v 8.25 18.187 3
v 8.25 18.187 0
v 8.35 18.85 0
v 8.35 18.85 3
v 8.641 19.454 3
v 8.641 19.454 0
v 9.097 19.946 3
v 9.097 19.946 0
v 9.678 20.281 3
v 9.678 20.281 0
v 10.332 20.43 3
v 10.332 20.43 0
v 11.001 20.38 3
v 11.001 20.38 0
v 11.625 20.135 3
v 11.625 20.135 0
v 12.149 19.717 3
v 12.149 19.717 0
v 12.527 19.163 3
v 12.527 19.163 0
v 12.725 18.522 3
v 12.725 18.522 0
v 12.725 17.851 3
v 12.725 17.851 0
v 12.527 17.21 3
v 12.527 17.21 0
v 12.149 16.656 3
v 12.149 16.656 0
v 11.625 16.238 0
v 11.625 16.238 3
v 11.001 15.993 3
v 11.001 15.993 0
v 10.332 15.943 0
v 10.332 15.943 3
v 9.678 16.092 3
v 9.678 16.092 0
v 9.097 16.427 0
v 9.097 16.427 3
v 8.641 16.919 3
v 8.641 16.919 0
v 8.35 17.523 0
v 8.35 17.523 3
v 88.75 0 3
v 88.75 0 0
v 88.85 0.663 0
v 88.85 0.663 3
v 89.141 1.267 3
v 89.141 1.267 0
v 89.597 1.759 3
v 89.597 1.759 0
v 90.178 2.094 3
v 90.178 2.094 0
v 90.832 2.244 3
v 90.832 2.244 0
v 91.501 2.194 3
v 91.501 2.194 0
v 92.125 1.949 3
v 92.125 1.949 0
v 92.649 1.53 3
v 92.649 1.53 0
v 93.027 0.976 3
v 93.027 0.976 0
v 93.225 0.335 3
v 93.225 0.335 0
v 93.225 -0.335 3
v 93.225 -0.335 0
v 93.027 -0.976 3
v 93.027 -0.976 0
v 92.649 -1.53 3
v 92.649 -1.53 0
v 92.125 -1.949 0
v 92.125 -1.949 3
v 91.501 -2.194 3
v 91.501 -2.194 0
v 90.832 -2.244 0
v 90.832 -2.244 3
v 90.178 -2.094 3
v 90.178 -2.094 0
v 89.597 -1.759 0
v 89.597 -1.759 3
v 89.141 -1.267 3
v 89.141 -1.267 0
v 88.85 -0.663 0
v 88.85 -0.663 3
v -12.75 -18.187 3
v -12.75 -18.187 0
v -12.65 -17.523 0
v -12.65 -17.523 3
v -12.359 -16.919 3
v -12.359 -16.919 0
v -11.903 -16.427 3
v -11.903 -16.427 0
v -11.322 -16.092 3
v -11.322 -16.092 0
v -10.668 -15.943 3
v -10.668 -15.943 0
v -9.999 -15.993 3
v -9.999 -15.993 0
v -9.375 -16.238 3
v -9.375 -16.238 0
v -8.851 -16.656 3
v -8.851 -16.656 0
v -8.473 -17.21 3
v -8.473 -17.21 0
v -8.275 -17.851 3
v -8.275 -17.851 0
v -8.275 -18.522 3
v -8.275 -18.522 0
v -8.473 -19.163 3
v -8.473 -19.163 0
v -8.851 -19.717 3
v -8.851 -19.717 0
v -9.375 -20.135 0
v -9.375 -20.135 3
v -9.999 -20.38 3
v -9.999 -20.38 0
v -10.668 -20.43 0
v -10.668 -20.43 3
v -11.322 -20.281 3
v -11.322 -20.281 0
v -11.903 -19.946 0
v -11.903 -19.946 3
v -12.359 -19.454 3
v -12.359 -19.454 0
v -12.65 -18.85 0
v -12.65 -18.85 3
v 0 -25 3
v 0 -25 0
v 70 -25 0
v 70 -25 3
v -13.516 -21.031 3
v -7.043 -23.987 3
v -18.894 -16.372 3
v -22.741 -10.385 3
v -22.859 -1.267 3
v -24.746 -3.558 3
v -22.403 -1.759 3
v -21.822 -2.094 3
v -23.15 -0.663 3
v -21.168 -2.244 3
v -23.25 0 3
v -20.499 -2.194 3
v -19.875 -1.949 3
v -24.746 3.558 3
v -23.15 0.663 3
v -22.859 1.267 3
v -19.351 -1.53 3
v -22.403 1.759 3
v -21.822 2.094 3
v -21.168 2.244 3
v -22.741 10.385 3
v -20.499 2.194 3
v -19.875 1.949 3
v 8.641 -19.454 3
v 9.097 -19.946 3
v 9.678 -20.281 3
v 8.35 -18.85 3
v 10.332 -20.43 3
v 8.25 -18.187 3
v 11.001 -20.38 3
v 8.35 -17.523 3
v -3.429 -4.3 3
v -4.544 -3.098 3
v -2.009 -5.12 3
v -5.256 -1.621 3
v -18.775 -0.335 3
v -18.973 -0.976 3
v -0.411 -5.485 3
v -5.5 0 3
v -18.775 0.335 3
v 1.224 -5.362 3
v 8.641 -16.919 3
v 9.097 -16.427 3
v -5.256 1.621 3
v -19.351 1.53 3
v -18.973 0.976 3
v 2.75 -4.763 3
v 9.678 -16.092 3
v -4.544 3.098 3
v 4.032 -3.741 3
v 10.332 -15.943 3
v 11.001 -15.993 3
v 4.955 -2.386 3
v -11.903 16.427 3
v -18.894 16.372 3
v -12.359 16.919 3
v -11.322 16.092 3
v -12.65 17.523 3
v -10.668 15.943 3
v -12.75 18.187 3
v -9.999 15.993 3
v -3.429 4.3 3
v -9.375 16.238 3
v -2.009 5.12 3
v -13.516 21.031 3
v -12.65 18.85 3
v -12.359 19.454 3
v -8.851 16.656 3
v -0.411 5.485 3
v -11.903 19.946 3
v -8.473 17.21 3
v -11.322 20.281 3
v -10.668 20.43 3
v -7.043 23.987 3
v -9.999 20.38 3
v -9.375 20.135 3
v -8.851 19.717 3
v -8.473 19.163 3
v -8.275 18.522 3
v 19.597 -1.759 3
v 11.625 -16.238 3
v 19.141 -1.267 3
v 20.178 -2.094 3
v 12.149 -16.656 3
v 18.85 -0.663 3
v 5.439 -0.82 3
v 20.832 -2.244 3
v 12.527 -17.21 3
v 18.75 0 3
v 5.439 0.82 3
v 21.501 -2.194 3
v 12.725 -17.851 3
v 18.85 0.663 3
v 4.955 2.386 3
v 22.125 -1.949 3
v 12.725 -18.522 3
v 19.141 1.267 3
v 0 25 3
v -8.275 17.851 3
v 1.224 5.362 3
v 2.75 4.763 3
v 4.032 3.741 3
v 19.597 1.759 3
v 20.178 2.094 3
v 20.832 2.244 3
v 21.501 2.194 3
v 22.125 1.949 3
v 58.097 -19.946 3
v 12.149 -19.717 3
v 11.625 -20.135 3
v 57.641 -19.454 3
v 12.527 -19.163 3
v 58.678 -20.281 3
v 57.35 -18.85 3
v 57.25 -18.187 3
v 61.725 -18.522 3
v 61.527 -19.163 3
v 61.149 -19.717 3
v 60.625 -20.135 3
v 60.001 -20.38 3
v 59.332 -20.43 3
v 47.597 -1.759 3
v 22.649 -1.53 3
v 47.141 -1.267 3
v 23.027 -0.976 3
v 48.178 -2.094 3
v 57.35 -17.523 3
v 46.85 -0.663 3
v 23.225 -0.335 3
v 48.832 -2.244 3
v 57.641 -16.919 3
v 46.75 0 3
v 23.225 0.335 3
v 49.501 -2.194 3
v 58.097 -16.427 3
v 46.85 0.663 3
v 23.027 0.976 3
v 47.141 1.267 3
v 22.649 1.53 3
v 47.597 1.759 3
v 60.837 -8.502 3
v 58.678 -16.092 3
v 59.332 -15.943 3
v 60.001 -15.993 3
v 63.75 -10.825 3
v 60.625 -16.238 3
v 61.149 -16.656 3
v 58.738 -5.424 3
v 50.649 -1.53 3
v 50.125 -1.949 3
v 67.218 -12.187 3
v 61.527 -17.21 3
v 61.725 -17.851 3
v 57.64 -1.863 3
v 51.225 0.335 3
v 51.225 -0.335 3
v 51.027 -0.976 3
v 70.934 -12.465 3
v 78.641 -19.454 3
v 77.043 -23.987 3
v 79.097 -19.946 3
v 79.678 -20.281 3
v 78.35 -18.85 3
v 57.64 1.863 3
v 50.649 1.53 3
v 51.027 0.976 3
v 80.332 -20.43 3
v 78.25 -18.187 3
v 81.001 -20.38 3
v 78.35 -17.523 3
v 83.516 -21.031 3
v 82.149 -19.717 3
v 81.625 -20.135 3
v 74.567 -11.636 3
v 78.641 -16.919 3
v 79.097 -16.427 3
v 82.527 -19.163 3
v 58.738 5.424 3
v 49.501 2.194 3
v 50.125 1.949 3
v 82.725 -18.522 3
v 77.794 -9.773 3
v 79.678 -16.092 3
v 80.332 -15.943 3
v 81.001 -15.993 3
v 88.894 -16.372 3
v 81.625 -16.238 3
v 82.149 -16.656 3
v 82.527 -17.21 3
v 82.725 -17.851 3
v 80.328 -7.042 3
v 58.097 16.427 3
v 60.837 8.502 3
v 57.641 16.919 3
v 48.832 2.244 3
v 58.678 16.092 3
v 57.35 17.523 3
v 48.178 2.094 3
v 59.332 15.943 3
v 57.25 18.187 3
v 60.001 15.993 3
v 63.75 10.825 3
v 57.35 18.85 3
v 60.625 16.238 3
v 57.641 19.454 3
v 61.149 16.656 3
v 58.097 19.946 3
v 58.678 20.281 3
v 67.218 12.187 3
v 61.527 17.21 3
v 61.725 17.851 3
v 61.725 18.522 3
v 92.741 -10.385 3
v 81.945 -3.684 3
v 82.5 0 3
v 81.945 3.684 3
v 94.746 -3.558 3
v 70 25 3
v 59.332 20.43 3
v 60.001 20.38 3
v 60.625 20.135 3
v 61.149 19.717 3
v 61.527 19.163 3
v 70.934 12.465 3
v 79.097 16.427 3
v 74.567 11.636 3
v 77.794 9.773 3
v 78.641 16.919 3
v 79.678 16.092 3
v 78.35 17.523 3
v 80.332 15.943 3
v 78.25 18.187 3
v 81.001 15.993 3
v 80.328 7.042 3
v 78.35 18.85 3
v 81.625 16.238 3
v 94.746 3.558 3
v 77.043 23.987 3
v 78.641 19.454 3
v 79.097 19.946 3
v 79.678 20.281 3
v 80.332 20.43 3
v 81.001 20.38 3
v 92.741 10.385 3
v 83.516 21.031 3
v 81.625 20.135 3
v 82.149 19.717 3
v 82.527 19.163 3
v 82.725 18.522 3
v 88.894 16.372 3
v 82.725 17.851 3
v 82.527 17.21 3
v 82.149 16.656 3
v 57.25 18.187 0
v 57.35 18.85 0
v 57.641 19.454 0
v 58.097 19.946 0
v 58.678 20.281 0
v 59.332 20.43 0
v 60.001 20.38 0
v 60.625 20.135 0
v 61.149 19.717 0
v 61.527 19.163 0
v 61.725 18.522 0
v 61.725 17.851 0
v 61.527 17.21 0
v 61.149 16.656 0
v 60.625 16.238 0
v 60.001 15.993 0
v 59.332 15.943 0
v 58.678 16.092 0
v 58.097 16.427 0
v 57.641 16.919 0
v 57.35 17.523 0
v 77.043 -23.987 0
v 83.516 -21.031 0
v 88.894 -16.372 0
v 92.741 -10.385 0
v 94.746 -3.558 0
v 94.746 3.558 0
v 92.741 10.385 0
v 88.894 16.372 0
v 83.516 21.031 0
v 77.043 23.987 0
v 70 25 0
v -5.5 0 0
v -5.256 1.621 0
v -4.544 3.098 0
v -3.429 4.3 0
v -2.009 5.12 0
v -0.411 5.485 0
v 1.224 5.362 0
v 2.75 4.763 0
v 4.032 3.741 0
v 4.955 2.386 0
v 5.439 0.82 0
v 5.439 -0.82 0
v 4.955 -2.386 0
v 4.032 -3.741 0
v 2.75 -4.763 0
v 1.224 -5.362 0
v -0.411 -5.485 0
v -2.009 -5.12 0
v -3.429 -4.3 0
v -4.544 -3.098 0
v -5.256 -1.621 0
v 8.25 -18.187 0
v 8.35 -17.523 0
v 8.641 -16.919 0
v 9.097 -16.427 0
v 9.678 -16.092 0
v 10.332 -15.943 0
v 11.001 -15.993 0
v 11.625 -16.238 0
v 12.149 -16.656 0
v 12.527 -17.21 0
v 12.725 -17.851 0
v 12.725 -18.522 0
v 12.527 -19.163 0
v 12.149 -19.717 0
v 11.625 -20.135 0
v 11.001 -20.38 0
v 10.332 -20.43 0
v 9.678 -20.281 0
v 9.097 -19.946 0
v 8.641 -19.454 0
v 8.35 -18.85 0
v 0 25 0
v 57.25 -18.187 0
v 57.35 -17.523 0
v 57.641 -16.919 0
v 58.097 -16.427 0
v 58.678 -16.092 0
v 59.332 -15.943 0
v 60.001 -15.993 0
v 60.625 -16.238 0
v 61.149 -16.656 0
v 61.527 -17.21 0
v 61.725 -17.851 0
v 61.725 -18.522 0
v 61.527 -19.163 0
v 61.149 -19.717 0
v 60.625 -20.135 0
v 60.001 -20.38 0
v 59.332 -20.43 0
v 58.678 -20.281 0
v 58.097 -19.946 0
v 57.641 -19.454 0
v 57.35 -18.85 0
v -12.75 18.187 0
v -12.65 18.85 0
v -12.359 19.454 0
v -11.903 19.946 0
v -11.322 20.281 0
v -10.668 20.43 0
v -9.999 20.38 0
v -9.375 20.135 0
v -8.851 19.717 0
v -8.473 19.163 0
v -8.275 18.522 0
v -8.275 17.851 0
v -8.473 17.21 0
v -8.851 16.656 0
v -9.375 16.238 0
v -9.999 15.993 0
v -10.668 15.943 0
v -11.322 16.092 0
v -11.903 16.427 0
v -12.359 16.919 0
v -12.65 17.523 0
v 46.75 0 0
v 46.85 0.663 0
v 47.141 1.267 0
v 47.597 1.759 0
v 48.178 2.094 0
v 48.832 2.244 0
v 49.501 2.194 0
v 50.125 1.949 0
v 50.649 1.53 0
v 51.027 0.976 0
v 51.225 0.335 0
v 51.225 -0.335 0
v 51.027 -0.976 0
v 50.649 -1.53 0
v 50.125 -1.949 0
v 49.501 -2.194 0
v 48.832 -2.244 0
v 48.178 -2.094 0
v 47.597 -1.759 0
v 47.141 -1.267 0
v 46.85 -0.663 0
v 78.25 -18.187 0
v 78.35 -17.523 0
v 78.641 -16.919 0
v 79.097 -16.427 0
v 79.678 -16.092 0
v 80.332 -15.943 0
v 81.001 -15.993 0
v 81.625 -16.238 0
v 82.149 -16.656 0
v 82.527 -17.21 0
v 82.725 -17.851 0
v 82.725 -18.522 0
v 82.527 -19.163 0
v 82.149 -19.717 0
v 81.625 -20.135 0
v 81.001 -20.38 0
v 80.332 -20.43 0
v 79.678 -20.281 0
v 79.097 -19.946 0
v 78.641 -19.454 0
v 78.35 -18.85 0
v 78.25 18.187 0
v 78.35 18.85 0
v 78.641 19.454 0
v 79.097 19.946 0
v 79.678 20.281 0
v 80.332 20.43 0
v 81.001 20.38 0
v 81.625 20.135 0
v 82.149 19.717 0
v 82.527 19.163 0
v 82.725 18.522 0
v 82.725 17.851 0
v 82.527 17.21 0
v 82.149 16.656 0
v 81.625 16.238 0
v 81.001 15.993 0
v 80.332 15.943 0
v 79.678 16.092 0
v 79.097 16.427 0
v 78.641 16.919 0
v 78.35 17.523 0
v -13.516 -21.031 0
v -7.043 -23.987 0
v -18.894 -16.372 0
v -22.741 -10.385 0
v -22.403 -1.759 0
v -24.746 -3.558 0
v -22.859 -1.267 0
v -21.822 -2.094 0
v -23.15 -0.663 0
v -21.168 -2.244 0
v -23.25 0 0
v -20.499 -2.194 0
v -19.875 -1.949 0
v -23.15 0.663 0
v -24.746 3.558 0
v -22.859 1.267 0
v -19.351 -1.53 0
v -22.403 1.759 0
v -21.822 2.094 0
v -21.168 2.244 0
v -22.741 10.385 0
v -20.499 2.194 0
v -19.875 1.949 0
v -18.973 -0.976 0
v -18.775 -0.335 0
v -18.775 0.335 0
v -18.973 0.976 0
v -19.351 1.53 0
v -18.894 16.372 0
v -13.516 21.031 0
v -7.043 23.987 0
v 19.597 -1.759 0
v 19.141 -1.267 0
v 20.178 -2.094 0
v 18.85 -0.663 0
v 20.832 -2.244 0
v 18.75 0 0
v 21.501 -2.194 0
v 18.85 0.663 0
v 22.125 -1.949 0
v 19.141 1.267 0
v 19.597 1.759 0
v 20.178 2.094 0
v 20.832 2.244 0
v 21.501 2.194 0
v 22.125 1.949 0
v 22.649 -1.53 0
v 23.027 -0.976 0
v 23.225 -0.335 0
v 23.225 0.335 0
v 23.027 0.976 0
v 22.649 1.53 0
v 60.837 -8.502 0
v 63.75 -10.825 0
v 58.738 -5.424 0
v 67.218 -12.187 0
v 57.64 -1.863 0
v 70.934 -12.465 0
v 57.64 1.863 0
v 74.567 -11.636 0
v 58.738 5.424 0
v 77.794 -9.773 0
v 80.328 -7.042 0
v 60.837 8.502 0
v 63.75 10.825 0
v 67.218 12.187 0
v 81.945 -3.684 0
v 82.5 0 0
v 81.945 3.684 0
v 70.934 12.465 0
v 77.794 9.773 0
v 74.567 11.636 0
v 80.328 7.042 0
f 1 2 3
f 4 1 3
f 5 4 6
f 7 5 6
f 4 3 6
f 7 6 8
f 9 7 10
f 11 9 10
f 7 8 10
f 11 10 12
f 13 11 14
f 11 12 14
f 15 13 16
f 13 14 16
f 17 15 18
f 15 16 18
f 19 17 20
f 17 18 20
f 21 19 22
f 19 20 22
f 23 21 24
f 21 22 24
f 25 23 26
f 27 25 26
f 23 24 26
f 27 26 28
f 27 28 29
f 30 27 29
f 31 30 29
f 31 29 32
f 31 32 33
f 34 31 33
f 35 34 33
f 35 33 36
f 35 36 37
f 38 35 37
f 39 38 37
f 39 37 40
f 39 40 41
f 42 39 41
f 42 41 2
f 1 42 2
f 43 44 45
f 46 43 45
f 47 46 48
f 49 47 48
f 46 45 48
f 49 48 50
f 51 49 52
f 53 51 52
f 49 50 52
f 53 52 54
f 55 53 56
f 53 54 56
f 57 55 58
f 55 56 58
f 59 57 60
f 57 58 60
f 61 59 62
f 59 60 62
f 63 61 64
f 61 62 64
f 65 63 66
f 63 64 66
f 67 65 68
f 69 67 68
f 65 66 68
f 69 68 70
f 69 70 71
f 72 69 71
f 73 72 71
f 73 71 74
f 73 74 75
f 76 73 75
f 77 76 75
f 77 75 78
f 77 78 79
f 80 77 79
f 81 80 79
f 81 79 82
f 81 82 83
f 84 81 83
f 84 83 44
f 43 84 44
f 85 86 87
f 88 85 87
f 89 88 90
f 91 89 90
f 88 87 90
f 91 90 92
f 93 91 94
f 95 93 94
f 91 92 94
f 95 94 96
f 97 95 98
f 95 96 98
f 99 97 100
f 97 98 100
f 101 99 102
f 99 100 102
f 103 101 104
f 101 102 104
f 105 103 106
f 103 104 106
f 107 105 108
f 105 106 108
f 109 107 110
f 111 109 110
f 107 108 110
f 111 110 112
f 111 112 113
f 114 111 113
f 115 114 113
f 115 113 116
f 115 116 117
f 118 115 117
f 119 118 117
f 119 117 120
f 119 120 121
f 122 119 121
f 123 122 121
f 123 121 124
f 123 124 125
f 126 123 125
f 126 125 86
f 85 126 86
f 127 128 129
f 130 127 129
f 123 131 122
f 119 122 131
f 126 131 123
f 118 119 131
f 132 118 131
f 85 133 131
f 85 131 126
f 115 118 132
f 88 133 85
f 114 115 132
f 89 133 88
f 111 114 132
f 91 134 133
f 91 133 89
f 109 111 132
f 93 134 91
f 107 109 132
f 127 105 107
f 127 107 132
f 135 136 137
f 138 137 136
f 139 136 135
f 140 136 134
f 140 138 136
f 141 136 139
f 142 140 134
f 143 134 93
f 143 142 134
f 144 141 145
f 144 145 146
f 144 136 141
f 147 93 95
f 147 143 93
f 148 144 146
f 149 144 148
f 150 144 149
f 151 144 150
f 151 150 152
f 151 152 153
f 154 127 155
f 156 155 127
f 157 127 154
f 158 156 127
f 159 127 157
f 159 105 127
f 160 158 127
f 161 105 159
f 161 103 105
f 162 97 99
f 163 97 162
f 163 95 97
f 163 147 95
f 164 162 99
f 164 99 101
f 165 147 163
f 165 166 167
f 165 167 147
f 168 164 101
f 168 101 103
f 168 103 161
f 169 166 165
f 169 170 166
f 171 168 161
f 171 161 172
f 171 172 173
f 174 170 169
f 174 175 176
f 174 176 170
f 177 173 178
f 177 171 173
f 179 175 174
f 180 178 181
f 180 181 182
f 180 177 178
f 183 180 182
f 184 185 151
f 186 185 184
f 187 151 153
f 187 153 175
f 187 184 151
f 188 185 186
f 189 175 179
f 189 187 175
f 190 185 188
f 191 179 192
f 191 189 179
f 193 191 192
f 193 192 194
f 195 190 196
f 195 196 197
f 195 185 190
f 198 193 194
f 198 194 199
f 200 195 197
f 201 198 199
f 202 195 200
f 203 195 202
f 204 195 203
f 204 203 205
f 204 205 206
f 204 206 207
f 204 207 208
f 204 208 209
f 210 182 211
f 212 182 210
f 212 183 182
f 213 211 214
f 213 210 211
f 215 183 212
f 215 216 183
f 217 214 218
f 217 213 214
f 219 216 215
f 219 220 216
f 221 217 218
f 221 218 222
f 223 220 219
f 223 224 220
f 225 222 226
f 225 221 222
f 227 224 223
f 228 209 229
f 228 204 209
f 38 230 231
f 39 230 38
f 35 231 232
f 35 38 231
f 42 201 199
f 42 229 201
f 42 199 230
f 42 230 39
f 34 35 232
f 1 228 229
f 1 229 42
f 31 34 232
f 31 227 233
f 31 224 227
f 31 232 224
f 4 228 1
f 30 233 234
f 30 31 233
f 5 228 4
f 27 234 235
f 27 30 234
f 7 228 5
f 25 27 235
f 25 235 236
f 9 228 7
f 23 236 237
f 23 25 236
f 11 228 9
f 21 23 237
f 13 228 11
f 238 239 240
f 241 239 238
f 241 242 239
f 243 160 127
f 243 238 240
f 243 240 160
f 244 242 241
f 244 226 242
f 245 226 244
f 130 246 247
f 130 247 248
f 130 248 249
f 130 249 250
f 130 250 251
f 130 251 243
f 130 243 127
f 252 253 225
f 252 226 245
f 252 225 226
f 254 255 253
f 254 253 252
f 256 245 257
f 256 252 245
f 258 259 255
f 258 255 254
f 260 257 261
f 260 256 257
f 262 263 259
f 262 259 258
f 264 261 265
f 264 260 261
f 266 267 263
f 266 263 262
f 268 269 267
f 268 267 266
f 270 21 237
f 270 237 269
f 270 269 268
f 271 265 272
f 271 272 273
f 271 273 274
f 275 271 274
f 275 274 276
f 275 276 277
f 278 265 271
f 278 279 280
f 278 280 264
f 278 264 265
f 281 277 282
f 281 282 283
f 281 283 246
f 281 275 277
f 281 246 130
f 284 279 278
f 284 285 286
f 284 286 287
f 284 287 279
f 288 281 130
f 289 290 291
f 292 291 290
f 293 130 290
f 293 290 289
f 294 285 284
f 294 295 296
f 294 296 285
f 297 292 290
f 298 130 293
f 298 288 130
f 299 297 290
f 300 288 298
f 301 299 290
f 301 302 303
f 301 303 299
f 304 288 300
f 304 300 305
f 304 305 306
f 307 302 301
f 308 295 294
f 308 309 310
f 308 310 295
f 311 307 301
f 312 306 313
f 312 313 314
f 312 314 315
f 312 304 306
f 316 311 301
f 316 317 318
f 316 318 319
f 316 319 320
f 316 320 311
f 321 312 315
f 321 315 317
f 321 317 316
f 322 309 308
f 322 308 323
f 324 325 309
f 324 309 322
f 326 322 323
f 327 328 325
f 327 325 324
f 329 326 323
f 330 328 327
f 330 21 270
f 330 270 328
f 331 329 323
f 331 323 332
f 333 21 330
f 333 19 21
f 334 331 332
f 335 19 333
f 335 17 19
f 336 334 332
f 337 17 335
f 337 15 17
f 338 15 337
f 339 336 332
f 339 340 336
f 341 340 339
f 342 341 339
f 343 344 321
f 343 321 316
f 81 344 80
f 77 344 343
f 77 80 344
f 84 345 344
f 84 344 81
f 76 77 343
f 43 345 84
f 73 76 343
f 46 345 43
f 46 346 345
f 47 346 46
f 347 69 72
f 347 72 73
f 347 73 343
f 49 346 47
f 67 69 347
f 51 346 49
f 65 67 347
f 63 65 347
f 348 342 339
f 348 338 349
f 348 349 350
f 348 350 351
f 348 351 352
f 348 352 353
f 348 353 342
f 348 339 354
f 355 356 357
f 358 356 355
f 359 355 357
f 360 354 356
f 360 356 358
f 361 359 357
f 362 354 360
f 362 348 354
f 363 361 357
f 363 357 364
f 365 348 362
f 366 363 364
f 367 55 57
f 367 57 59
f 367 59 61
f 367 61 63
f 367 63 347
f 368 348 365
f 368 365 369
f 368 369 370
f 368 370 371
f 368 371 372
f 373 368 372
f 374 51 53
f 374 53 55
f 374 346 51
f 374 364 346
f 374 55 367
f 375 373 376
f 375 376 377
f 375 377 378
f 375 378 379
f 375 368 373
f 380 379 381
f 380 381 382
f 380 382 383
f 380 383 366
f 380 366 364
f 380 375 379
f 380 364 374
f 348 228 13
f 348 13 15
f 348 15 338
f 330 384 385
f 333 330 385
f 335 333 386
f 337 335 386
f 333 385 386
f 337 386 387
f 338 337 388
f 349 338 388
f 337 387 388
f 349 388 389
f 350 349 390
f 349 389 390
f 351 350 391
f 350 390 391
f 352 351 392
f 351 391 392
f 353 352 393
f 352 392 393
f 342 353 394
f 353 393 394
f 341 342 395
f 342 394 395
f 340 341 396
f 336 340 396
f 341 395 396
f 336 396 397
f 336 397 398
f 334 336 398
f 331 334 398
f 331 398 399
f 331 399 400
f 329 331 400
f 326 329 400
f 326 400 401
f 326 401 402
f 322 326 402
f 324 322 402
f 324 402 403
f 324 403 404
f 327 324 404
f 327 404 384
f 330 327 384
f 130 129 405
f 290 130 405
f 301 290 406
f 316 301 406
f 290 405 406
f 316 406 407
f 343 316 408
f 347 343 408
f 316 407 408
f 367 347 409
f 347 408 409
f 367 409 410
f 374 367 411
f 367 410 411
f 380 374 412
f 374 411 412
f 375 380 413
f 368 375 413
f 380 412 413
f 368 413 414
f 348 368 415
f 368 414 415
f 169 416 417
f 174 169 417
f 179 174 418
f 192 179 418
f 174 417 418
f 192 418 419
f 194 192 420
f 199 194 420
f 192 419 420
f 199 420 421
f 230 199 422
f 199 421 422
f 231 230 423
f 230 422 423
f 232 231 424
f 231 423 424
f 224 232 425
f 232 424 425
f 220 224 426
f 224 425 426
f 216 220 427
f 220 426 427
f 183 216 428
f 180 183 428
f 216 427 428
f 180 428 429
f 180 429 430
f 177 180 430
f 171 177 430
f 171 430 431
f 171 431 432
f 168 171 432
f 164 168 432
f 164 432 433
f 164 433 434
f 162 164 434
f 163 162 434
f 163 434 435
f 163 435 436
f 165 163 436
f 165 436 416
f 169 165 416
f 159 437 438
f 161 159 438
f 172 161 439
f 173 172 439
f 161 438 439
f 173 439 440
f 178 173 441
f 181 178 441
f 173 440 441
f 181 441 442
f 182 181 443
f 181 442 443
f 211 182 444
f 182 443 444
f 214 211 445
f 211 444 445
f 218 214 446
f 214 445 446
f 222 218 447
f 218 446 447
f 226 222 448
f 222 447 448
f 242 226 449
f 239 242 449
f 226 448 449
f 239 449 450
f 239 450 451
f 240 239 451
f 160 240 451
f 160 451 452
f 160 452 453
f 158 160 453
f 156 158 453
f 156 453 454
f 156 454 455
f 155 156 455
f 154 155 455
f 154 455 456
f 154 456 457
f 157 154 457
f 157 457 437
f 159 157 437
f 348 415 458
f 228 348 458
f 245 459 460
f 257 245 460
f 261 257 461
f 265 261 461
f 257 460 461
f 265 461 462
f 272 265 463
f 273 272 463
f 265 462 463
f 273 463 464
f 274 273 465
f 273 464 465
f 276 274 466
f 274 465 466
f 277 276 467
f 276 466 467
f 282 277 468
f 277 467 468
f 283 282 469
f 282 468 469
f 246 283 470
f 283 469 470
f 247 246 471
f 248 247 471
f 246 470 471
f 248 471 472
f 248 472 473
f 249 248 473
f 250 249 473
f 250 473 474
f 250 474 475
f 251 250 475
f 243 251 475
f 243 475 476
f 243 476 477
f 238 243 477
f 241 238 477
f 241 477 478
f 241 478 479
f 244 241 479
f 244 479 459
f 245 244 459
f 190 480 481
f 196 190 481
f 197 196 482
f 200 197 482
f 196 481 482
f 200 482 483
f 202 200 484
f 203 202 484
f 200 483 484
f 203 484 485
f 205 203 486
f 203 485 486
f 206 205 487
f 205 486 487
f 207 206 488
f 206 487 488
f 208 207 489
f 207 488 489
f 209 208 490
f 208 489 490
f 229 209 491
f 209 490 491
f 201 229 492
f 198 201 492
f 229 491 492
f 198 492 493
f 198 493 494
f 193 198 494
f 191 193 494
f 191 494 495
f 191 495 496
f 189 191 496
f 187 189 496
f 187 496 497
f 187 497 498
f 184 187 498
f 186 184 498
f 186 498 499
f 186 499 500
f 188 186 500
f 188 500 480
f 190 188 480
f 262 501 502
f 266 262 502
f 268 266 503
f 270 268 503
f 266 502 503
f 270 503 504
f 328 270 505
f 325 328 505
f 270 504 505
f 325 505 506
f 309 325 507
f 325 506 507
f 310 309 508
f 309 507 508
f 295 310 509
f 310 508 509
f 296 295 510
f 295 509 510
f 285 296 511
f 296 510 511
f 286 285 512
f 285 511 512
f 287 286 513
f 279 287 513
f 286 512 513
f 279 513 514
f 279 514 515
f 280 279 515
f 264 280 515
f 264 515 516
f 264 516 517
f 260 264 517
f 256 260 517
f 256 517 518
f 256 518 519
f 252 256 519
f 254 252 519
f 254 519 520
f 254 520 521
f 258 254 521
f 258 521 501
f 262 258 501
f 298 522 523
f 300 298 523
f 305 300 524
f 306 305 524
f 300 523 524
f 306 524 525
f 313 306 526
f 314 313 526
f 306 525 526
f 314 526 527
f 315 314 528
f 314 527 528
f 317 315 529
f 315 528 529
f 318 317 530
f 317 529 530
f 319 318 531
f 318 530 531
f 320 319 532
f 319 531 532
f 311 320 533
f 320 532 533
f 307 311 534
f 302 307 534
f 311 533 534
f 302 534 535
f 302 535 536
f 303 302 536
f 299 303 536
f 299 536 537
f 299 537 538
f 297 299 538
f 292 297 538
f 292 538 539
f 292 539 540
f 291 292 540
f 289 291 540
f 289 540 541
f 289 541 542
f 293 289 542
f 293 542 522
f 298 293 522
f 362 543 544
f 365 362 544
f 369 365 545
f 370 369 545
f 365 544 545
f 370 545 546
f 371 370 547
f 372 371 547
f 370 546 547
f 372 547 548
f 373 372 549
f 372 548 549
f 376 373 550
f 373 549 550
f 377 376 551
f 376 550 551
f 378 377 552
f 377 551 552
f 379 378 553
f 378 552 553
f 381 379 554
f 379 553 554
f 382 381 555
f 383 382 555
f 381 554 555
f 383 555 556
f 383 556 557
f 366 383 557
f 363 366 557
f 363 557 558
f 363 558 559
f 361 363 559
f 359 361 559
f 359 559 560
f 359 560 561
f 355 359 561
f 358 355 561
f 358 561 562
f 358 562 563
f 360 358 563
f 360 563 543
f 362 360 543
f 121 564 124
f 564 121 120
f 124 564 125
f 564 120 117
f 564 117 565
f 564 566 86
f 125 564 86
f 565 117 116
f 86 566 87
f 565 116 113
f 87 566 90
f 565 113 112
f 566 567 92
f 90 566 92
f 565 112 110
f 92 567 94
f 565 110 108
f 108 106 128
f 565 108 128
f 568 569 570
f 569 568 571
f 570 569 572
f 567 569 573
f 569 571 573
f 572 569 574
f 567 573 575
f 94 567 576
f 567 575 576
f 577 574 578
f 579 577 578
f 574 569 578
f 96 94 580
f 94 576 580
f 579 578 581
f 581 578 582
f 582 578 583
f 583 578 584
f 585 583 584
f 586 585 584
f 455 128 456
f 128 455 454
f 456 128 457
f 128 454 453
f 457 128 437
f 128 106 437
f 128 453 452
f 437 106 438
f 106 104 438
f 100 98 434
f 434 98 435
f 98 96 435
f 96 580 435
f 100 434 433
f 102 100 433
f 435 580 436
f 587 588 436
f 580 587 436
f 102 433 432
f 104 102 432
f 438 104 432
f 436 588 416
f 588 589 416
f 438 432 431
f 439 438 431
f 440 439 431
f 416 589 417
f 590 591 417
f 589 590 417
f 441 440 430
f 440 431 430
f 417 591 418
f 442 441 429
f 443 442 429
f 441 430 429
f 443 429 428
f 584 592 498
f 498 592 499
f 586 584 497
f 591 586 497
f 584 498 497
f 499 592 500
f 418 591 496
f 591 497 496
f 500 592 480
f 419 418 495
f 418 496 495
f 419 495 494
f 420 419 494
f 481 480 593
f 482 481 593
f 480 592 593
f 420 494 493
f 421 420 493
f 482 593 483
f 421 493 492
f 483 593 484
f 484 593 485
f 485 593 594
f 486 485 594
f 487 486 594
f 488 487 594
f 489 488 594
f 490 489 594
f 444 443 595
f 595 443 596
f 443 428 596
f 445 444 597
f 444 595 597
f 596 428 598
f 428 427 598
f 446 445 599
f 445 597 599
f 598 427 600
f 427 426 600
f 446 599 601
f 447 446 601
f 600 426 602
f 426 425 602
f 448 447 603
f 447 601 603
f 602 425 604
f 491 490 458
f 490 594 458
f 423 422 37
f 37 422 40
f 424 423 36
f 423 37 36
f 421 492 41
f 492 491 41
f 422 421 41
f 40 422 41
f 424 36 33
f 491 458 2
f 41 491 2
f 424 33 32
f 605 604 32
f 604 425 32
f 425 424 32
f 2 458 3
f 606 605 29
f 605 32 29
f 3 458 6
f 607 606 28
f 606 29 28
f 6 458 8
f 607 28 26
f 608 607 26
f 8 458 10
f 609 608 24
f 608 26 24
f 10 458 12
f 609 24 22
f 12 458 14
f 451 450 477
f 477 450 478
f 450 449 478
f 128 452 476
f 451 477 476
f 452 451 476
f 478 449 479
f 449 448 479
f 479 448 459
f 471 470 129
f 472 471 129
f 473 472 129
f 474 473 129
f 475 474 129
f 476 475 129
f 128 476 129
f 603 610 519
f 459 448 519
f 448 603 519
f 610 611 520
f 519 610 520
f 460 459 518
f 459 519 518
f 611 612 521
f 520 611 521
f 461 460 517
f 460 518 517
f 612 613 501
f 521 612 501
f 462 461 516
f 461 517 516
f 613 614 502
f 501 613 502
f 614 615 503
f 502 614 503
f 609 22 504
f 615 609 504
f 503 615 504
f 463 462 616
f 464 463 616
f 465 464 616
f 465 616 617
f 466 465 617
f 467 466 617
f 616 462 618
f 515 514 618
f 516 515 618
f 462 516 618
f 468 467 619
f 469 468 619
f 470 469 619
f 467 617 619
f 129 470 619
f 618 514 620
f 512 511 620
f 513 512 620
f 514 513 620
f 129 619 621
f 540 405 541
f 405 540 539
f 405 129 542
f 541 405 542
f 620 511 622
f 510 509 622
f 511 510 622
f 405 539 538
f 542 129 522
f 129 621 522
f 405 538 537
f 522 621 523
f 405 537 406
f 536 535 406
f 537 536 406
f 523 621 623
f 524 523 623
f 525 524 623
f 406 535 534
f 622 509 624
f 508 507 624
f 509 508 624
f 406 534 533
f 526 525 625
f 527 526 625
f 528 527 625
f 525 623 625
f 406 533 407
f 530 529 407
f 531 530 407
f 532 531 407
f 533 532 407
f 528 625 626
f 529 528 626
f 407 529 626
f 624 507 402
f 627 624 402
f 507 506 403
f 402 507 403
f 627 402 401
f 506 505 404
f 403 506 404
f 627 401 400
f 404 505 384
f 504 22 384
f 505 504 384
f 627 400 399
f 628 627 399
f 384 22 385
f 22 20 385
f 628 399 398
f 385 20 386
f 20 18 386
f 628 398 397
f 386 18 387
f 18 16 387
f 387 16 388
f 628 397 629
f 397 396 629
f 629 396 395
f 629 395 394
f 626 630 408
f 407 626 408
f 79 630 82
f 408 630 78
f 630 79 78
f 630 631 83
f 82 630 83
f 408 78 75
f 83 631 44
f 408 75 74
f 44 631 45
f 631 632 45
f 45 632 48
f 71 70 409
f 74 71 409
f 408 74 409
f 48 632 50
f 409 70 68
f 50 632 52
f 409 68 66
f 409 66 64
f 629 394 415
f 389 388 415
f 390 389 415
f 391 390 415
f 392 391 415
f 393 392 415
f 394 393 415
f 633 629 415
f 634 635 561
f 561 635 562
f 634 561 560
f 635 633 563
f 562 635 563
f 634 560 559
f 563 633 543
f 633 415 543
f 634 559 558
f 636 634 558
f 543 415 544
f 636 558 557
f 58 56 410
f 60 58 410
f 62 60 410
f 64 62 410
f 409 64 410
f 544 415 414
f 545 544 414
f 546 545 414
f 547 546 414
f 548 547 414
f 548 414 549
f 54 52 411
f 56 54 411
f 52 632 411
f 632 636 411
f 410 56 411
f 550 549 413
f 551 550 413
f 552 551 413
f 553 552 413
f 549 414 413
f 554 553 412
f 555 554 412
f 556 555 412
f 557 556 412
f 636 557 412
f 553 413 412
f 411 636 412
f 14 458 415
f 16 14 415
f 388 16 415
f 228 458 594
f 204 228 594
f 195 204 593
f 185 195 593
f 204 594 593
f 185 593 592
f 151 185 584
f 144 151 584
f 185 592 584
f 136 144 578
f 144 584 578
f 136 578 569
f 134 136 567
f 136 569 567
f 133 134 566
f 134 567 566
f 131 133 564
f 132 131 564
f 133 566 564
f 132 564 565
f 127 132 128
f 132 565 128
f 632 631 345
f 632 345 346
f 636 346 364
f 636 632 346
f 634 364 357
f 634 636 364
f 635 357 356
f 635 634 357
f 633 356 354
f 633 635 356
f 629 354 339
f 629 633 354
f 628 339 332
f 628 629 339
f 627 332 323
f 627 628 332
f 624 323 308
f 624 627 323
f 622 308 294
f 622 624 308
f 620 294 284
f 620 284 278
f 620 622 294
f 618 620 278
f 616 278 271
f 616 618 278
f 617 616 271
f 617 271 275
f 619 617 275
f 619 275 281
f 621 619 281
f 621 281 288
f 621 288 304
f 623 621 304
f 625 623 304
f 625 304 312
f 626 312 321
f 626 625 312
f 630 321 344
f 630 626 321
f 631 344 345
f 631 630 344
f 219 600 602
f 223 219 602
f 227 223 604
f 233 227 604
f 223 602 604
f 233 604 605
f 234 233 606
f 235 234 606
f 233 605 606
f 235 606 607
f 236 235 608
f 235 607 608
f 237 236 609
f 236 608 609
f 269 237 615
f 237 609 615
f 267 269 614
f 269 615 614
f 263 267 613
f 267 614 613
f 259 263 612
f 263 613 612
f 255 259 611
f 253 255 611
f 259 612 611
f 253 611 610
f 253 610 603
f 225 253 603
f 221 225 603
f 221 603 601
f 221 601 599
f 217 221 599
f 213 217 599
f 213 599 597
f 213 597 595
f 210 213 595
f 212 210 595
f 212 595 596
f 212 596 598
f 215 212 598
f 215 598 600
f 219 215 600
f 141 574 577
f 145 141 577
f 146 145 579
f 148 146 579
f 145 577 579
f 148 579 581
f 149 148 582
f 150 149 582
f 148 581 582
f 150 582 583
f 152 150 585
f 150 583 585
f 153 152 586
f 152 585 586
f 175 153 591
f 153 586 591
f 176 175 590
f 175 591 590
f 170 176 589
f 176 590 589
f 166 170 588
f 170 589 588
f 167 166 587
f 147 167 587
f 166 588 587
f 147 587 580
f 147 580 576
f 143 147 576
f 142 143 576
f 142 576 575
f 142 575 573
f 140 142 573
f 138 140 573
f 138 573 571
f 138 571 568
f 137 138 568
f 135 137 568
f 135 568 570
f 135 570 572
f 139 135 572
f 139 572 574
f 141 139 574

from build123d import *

# Parameters (mm, degrees)
CROQUIS1_R                    = 12.5
SALIENTE_EXTRUIR1_DEPTH       = 3
TALADRO_DE_MARGEN_PARA_M42_D  = 4.5
TALADRO_DE_MARGEN_PARA_M101_D = 11


with BuildPart() as part:
    # Croquis1 → Saliente-Extruir1 (new body)
    with BuildSketch(Plane.XY):
        with BuildLine():
            Line((70, 25), (0, 25))
            ThreePointArc((0, 25), (-25, 0), (0, -25))
            Line((0, -25), (70, -25))
            ThreePointArc((70, -25), (95, 0), (70, 25))
        make_face()
        with Locations((70, 0)):
            Circle(CROQUIS1_R, mode=Mode.SUBTRACT)
    extrude(amount=SALIENTE_EXTRUIR1_DEPTH)

    # Taladro de margen para M42 (through all)
    with Locations(Plane.XY.offset(3)):
        with Locations((-21, 0), (91, 0), (-10.5, 18.186533479), (10.5, 18.186533479), (21, 0), (10.5, -18.186533479), (-10.5, -18.186533479), (80.5, -18.186533479), (59.5, -18.186533479), (49, 0), (59.5, 18.186533479), (80.5, 18.186533479)):
            Hole(TALADRO_DE_MARGEN_PARA_M42_D / 2)

    # Taladro de margen para M101 (through all)
    with Locations(Plane.XY.offset(3)):
        with Locations((0, 0)):
            Hole(TALADRO_DE_MARGEN_PARA_M101_D / 2)


solid = part.part
